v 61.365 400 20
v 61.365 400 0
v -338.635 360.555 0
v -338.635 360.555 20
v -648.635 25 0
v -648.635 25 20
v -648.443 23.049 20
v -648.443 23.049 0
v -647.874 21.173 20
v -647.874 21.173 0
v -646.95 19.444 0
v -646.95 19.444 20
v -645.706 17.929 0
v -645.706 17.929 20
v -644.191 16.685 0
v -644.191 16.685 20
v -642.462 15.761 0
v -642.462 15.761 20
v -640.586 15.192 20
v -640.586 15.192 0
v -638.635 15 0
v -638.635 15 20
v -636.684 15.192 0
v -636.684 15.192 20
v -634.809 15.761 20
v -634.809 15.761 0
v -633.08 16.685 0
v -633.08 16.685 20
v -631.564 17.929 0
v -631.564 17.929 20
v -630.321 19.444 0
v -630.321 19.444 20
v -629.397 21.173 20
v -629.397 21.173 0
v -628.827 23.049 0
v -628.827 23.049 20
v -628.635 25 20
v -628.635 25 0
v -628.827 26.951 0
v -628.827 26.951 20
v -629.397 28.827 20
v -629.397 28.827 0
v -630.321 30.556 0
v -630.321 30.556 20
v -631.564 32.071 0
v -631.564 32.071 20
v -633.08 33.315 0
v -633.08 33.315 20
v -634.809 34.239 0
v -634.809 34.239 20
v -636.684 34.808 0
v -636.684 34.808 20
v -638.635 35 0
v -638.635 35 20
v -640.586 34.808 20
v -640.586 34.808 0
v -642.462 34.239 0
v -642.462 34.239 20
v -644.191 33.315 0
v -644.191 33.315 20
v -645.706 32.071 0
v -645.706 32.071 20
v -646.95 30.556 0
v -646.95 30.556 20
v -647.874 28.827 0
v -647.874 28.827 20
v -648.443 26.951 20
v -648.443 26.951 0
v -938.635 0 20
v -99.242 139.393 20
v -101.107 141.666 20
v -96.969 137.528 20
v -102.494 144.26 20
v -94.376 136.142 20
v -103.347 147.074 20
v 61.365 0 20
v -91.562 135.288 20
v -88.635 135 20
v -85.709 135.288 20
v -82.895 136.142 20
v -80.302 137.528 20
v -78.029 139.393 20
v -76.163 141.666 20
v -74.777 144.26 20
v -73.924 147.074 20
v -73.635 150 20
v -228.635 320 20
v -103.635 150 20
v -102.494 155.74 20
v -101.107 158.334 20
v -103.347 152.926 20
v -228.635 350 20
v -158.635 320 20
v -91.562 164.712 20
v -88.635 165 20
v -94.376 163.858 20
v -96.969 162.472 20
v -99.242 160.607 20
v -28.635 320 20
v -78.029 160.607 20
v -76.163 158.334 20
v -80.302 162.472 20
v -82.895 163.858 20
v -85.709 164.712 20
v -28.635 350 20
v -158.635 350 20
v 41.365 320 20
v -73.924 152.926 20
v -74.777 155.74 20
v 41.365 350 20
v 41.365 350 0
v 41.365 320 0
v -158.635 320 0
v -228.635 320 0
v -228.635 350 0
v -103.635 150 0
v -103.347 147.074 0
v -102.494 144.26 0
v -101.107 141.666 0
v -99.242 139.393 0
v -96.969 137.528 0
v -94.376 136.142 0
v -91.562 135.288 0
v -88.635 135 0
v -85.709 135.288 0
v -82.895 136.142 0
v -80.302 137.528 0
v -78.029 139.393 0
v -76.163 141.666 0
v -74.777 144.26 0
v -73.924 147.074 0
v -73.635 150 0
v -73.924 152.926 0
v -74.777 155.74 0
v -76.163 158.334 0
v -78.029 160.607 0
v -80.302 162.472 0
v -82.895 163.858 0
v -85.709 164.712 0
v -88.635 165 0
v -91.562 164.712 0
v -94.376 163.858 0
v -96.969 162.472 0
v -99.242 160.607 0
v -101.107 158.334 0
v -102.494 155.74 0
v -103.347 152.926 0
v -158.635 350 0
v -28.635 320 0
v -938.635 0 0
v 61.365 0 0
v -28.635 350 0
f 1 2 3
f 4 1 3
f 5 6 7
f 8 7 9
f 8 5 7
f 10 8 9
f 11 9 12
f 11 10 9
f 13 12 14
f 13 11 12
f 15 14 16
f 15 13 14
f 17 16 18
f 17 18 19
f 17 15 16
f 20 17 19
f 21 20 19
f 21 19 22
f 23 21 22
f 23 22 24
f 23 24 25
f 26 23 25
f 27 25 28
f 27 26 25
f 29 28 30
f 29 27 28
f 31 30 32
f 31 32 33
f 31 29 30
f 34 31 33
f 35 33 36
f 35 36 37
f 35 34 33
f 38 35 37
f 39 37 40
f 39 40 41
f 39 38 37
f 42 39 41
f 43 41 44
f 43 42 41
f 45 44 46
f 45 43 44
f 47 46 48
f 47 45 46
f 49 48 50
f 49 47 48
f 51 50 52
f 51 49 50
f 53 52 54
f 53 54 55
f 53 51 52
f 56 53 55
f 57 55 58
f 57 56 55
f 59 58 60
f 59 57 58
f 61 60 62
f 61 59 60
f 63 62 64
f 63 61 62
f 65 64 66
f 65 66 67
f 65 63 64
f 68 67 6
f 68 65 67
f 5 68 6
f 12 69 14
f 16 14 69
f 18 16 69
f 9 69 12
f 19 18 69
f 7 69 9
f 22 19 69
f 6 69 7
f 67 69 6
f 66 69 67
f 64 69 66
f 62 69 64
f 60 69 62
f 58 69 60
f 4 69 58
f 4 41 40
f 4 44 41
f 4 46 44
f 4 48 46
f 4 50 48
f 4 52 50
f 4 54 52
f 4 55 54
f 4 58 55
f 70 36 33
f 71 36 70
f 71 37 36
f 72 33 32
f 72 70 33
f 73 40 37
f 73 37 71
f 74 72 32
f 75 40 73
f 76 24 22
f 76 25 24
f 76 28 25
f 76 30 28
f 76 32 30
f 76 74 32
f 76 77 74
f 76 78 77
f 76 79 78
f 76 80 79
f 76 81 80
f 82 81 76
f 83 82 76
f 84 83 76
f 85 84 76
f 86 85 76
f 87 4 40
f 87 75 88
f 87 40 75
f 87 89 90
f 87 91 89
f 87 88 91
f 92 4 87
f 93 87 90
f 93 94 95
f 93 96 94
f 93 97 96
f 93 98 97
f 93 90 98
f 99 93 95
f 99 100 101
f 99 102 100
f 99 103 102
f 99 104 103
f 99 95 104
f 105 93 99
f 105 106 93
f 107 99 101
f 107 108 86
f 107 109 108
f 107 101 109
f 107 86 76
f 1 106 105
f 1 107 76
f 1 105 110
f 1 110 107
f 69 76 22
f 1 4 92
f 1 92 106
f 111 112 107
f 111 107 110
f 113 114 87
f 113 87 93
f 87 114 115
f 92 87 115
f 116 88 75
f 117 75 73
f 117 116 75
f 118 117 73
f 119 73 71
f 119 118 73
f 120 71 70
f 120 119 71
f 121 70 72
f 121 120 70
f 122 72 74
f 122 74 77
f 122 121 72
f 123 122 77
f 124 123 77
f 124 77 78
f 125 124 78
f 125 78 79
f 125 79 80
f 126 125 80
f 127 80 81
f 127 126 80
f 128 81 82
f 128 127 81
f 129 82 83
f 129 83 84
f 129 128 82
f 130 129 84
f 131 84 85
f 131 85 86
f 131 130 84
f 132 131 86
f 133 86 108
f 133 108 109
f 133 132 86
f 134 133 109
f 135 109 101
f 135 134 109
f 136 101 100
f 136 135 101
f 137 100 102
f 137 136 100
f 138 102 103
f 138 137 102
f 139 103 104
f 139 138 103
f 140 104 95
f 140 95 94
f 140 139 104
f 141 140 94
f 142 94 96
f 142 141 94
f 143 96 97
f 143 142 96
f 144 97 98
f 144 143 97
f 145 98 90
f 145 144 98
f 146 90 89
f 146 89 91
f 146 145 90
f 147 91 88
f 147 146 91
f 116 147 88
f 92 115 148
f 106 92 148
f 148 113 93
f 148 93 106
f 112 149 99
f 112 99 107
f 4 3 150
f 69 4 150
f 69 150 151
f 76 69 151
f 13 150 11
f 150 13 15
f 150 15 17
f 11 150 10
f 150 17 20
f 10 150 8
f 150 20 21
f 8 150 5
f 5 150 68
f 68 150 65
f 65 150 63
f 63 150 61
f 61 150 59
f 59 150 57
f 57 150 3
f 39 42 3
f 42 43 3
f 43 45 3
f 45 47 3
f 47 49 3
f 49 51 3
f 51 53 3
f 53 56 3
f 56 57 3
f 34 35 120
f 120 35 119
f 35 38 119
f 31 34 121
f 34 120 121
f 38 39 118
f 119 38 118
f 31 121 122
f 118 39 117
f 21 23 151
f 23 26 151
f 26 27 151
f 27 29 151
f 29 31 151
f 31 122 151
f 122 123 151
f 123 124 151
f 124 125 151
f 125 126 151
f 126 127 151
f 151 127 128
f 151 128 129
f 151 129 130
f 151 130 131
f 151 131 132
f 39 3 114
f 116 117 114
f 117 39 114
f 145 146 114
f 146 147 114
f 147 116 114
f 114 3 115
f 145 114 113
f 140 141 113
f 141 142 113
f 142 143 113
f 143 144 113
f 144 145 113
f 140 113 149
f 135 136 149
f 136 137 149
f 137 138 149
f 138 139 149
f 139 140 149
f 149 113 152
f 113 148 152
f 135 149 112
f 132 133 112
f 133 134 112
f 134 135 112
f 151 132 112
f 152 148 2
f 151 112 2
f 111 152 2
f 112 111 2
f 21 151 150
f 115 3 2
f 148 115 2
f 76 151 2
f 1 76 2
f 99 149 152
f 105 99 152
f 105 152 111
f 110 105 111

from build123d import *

# Parameters (mm, degrees)
EXTRUDE_1_DEPTH     = 20
SKETCH_2_R          = 15
SKETCH_2_R_2        = 10
SKETCH_2_W          = 70
SKETCH_2_H          = 30
CUT_EXTRUDE_2_DEPTH = 20


with BuildPart() as part:
    # 草图1 → 凸台-拉伸1 (new body)
    with BuildSketch(Plane.XY):
        Polygon((-938.635343121, 0), (61.364656879, 0), (61.364656879, 400), (-338.635343121, 360.555127546), align=None)
    extrude(amount=EXTRUDE_1_DEPTH)

    # 草图2 → 切除-拉伸2 (cut)
    with BuildSketch(Plane.XY):
        with Locations(Location((-88.635343121, 150, 0), (0, 0, 180))):
            Circle(SKETCH_2_R)
        with Locations(Location((-638.635343121, 25, 0), (0, 0, 180))):
            Circle(SKETCH_2_R_2)
        with Locations((-193.635343121, 335)):
            Rectangle(SKETCH_2_W, SKETCH_2_H)
        with Locations((6.364656879, 335)):
            Rectangle(SKETCH_2_W, SKETCH_2_H)
    extrude(amount=CUT_EXTRUDE_2_DEPTH, mode=Mode.SUBTRACT)


solid = part.part
